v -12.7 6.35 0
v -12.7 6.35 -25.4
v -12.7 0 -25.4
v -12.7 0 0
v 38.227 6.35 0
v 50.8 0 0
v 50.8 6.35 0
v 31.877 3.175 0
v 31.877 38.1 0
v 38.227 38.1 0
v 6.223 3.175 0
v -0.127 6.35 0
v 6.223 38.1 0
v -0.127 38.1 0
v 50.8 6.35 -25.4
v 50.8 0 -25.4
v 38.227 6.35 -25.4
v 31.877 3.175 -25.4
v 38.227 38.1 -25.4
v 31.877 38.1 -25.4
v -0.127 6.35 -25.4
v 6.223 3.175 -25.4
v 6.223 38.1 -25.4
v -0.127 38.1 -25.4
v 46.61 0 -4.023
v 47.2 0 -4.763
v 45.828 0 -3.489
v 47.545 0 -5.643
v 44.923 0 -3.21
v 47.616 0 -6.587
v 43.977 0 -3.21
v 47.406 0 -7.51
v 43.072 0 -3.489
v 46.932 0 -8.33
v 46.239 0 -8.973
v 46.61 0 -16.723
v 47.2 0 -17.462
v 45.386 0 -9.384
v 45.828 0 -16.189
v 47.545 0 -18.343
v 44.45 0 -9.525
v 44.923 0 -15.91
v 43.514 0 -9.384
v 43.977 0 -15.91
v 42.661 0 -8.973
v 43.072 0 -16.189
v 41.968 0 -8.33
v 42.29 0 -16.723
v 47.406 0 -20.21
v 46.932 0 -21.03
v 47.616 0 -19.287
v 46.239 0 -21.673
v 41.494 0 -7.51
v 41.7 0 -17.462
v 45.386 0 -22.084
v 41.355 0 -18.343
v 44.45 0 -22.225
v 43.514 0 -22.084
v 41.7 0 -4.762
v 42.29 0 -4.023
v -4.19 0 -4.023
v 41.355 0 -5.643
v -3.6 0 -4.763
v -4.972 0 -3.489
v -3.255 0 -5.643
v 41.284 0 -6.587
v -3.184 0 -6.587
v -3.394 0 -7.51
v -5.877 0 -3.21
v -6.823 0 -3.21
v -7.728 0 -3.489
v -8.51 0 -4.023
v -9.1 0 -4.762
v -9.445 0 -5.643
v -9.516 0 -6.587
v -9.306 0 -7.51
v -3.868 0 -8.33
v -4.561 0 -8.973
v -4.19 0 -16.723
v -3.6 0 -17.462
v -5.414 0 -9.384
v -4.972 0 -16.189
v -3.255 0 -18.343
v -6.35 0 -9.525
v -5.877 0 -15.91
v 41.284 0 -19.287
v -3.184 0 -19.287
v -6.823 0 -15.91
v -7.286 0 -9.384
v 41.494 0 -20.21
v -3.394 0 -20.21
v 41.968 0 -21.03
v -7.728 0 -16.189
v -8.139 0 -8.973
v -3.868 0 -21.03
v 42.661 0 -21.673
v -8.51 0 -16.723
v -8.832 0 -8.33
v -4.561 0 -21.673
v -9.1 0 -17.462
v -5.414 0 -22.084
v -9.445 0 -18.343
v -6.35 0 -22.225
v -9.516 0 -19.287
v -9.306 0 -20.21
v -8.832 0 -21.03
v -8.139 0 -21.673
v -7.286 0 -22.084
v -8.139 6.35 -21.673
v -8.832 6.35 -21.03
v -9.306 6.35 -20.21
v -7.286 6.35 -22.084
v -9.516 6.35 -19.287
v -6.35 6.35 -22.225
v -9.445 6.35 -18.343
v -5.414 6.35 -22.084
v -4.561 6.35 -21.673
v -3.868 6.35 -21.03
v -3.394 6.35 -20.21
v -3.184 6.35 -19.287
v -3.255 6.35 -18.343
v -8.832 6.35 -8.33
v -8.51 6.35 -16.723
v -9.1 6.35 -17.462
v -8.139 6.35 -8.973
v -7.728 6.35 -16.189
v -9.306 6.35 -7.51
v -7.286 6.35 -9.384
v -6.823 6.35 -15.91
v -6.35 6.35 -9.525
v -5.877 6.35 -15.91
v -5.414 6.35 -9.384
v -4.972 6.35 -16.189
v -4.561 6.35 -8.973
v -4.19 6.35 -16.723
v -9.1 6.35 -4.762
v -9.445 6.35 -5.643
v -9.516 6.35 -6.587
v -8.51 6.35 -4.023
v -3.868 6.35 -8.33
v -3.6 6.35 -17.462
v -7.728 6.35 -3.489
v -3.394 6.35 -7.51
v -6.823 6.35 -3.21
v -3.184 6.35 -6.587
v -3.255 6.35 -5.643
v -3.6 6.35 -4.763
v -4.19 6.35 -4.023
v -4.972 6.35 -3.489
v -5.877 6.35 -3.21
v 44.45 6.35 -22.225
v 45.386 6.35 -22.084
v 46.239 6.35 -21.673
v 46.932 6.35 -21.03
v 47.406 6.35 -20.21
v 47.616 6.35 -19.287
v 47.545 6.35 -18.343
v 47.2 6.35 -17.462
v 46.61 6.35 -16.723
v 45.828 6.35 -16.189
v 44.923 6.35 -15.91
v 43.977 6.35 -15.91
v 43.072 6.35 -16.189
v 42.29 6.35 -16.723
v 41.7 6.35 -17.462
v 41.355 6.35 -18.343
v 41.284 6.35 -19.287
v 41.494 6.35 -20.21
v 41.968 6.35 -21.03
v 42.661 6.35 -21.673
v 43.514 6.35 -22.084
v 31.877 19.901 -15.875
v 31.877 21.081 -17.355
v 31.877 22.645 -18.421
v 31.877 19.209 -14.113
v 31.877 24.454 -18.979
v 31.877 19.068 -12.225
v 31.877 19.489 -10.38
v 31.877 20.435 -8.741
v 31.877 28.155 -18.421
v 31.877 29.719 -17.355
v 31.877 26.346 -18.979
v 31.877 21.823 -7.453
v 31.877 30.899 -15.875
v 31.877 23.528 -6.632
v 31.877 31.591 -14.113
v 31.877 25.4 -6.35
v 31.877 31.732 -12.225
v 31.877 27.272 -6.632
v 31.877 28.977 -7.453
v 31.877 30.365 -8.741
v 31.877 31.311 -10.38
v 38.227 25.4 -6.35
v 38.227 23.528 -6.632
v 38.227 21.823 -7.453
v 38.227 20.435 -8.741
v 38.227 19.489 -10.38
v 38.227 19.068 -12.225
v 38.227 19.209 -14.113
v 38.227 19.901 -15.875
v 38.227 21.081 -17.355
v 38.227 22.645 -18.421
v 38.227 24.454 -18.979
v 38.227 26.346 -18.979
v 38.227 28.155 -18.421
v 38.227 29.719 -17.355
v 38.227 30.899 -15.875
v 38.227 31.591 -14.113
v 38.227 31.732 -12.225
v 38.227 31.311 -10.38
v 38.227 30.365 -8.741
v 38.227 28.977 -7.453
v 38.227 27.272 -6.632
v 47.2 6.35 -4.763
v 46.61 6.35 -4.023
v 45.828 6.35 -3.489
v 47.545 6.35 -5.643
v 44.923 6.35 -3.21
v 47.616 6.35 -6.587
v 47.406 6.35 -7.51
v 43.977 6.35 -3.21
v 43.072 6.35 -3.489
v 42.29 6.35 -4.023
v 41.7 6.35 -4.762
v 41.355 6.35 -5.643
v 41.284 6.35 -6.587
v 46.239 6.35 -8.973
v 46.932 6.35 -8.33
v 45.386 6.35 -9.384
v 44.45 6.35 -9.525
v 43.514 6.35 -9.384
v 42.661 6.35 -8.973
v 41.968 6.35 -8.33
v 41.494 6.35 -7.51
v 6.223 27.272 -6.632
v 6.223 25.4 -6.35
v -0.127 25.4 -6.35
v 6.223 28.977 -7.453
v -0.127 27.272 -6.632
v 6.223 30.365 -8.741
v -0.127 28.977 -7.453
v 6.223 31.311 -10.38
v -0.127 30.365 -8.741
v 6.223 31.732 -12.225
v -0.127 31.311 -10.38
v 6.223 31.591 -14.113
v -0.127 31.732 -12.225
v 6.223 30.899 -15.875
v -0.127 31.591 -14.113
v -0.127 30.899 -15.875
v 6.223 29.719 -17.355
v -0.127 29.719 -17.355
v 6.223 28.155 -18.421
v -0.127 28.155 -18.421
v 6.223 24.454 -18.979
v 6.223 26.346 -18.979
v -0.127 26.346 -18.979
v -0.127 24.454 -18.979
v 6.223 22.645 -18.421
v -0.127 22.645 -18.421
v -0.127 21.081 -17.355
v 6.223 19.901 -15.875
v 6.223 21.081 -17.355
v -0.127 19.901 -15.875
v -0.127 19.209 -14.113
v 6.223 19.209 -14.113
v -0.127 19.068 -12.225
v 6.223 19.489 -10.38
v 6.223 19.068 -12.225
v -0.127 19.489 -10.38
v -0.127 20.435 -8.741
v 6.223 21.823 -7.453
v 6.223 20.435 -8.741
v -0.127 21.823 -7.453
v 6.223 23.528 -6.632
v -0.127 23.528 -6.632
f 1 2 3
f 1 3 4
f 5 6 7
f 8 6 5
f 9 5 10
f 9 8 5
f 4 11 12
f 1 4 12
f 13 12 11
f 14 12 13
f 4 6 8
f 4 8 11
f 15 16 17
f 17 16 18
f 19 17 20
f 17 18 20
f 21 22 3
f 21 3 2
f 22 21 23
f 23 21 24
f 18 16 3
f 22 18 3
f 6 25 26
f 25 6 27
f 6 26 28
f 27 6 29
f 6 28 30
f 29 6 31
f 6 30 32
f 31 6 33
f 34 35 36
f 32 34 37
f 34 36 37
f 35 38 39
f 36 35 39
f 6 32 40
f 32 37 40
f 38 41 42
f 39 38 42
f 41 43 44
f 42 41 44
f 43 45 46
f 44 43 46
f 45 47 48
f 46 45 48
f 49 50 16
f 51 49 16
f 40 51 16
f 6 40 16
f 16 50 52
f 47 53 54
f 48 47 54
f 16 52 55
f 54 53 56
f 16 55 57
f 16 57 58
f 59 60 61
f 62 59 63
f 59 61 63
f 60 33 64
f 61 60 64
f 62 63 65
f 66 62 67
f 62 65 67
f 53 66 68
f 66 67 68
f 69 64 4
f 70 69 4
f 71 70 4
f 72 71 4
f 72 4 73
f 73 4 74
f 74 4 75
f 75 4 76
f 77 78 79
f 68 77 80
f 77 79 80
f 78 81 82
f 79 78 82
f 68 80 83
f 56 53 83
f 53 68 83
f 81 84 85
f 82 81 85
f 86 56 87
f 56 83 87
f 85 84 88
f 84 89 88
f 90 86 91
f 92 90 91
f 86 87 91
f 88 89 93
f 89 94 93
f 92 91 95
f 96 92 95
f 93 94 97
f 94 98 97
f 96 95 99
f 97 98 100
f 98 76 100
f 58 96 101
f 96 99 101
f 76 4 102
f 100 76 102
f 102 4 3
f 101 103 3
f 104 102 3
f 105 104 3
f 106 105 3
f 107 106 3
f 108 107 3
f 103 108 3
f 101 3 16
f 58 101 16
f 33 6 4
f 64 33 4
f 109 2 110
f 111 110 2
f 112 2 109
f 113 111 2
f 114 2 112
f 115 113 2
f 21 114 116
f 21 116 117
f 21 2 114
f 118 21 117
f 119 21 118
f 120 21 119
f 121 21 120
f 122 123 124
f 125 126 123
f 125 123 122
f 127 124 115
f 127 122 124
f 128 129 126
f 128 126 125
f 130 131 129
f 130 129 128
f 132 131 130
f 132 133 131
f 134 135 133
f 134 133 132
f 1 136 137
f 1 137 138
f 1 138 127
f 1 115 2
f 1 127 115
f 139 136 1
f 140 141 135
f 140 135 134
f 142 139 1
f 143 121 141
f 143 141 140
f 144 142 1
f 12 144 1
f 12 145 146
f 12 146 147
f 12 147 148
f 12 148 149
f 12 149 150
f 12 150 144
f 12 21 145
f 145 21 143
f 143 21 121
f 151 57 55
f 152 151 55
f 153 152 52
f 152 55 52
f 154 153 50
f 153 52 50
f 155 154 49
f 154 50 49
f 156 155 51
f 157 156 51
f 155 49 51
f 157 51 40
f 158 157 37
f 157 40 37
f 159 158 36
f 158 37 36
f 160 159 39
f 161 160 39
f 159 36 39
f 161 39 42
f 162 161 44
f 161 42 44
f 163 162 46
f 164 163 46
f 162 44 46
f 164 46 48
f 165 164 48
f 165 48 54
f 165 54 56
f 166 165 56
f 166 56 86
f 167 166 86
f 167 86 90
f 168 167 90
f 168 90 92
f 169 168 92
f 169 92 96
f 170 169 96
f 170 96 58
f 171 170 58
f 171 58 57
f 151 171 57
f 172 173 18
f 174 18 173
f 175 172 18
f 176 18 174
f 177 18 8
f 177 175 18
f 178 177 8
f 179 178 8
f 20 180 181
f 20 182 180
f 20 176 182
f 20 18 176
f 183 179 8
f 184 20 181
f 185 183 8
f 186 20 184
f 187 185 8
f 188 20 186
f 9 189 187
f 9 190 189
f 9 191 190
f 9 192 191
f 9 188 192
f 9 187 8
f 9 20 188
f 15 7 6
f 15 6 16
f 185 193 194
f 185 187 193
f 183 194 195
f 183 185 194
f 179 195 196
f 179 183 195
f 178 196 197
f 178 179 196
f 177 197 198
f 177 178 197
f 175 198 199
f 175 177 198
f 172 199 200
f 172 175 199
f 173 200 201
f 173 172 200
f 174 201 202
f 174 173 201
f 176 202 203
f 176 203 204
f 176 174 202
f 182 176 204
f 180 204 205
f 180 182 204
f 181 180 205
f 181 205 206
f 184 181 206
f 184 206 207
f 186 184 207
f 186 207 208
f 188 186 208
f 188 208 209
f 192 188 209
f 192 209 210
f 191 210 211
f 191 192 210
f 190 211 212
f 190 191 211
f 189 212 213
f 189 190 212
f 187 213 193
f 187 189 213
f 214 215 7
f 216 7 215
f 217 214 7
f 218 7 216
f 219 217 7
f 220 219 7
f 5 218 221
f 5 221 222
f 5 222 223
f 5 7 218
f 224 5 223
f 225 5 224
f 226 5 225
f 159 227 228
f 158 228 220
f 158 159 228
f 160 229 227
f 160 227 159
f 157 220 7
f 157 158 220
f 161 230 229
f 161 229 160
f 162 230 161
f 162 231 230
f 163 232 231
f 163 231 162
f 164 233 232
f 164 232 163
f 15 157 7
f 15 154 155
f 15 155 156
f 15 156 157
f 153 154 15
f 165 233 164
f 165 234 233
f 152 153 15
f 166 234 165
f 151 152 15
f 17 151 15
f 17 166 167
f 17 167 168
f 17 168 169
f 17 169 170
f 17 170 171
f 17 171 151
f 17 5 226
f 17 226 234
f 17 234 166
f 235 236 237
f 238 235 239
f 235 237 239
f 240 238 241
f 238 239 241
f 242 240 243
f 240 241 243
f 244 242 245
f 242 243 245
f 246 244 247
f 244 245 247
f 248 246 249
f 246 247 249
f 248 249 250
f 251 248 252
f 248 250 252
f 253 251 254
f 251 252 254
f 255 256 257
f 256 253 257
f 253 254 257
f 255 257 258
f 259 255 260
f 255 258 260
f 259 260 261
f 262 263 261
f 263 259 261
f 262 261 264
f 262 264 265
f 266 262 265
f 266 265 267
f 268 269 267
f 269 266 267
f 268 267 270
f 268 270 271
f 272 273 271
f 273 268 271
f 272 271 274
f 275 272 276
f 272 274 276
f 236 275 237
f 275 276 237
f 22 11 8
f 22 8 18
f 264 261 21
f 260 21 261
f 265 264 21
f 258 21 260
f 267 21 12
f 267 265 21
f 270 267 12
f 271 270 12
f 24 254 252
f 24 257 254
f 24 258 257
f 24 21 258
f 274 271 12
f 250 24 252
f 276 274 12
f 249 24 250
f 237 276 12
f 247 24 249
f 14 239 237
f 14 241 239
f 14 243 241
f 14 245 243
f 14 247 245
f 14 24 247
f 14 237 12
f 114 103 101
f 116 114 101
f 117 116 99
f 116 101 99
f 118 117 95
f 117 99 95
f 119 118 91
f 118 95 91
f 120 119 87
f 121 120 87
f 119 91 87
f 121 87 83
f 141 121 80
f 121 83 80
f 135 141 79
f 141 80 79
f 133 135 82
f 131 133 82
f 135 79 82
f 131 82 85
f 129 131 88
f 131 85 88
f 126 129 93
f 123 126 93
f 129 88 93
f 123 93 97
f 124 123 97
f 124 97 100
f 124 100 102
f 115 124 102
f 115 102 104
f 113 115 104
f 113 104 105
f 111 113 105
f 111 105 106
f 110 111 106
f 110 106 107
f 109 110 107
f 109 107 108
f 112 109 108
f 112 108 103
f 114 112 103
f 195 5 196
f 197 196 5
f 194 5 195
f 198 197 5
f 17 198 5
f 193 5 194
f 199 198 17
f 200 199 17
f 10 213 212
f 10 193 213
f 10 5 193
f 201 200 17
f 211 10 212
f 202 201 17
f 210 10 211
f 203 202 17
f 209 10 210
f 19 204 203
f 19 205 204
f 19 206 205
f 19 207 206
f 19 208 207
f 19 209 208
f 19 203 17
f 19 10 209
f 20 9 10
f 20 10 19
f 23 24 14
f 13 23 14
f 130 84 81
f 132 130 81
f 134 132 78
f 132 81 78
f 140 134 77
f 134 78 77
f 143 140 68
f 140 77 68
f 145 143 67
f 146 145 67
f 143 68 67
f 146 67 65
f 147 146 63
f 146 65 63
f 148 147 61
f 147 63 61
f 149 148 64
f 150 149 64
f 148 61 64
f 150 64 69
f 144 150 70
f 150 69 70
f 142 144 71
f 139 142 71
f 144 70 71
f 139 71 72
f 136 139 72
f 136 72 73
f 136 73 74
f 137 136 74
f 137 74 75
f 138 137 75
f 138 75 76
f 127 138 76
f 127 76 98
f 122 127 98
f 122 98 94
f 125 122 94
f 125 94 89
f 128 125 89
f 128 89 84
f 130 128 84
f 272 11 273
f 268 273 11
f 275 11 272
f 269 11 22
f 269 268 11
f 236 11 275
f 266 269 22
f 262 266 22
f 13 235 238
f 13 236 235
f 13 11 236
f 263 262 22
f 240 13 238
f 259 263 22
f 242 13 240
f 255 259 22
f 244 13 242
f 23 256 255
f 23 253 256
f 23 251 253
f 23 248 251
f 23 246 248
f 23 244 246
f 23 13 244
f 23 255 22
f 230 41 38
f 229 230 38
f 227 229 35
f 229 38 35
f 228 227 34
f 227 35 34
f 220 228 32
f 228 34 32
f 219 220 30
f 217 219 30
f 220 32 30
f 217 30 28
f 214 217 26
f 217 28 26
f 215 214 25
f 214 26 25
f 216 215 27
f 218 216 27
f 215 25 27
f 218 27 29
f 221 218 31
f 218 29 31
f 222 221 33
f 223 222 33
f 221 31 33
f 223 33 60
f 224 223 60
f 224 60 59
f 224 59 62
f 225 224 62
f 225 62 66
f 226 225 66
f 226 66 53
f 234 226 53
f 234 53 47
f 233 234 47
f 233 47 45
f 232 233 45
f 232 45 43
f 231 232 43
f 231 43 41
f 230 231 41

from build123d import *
from build123d.topology import SkipClean

# Parameters (mm, degrees)
SKETCH2_W                       = 6.35
SKETCH2_H                       = 25.4
BOSS_EXTRUDE1_DEPTH             = 38.1
BOSS_EXTRUDE1_2_DEPTH           = 38.1
SKETCH2_3_W                     = 25.4
SKETCH2_3_H                     = 25.4
BOSS_EXTRUDE2_DEPTH             = 3.175
SKETCH3_R                       = 6.35
CUT_EXTRUDE1_DEPTH              = 60.56828015
SKETCH4_W                       = 25.4
SKETCH4_H                       = 6.35
BOSS_EXTRUDE3_DEPTH             = 12.7
SKETCH9_W                       = 25.4
SKETCH9_H                       = 6.35
BOSS_EXTRUDE5_DEPTH             = 12.7
F_1_4_0_25_DIAMETER_HOLE1_D     = 6.35
F_1_4_0_25_DIAMETER_HOLE1_DEPTH = 25.4
F_1_4_0_25_DIAMETER_HOLE1_TIP   = 1.907732465
CUT_EXTRUDE2_START              = -0.127
SKETCH13_W                      = 25.4
SKETCH13_H                      = 34.925
SKETCH13_R                      = 6.35
CUT_EXTRUDE2_DEPTH              = 0.127
SKETCH14_W                      = 25.4
SKETCH14_H                      = 34.925
SKETCH14_R                      = 6.35
CUT_EXTRUDE3_DEPTH              = 0.127
SKETCH16_W                      = 25.4
SKETCH16_H                      = 31.75
SKETCH16_R                      = 6.35
BOSS_EXTRUDE8_DEPTH             = 0.127
BOSS_EXTRUDE9_START             = 0.127
SKETCH15_W                      = 25.4
SKETCH15_H                      = 31.75
SKETCH15_R                      = 6.35
BOSS_EXTRUDE9_DEPTH             = 0.127


with BuildPart() as part:
    # Sketch2 → Boss-Extrude1 (new body)
    with BuildSketch(Plane(origin=(0, 0, 0), x_dir=(1, 0, 0), z_dir=(0, 1, 0))):
        with Locations((3.175, 12.7)):
            Rectangle(SKETCH2_W, SKETCH2_H)
    extrude(amount=BOSS_EXTRUDE1_DEPTH)



with BuildPart() as body_2:
    # Sketch2 → Boss-Extrude1 2 (new body)
    with BuildSketch(Plane(origin=(0, 0, 0), x_dir=(1, 0, 0), z_dir=(0, 1, 0))):
        with Locations((34.925, 12.7)):
            Rectangle(SKETCH2_W, SKETCH2_H)
    extrude(amount=BOSS_EXTRUDE1_2_DEPTH)


with BuildPart() as part_1:
    add(part.part)

    add(body_2.part)  # Boss-Extrude2 merges body 2
    # Sketch2<3> → Boss-Extrude2 (add)
    with BuildSketch(Plane(origin=(0, 0, 0), x_dir=(1, 0, 0), z_dir=(0, 1, 0))):
        with Locations((19.05, 12.7)):
            Rectangle(SKETCH2_3_W, SKETCH2_3_H)
    extrude(amount=BOSS_EXTRUDE2_DEPTH)

    # Sketch3 → Cut-Extrude1 (cut, through all)
    with BuildSketch(Plane.ZY):
        with Locations((-12.7, 25.4)):
            Circle(SKETCH3_R)
    extrude(amount=-CUT_EXTRUDE1_DEPTH, mode=Mode.SUBTRACT)

    # Sketch4 → Boss-Extrude3 (add)
    with BuildSketch(Plane.ZY):
        with Locations((-12.7, 3.175)):
            Rectangle(SKETCH4_W, SKETCH4_H)
    extrude(amount=BOSS_EXTRUDE3_DEPTH)

    # Sketch9 → Boss-Extrude5 (add)
    with BuildSketch(Plane(origin=(38.1, 0, 0), x_dir=(0, 0, -1), z_dir=(1, 0, 0))):
        with Locations((12.7, 3.175)):
            Rectangle(SKETCH9_W, SKETCH9_H)
    extrude(amount=BOSS_EXTRUDE5_DEPTH)

    # 1/4 (0.25) Diameter Hole1
    with Locations(Plane(origin=(-6.35, 6.35, -19.05), x_dir=(0, 0, 1), z_dir=(0, 1, 0))):
        with Locations((0, 0), (12.7, 0), (12.7, 50.8), (0, 50.8)):
            Hole(F_1_4_0_25_DIAMETER_HOLE1_D / 2, depth=F_1_4_0_25_DIAMETER_HOLE1_DEPTH)
            with Locations((0, 0, -(F_1_4_0_25_DIAMETER_HOLE1_DEPTH + F_1_4_0_25_DIAMETER_HOLE1_TIP / 2))):  # 118° drill point
                Cone(0, F_1_4_0_25_DIAMETER_HOLE1_D / 2, F_1_4_0_25_DIAMETER_HOLE1_TIP, mode=Mode.SUBTRACT)

    # Sketch13 → Cut-Extrude2 (cut)
    with BuildSketch(Plane(origin=(6.35, 0, 0), x_dir=(0, 0, -1), z_dir=(1, 0, 0)).offset(CUT_EXTRUDE2_START)):
        with Locations((12.7, 20.6375)):
            Rectangle(SKETCH13_W, SKETCH13_H)
        with Locations((12.7, 25.4)):
            Circle(SKETCH13_R, mode=Mode.SUBTRACT)
    extrude(amount=CUT_EXTRUDE2_DEPTH, mode=Mode.SUBTRACT)

    # Sketch14 → Cut-Extrude3 (cut)
    with BuildSketch(Plane.ZY.offset(-31.75)):
        with Locations((-12.7, 20.6375)):
            Rectangle(SKETCH14_W, SKETCH14_H)
        with Locations((-12.7, 25.4)):
            Circle(SKETCH14_R, mode=Mode.SUBTRACT)
    extrude(amount=-CUT_EXTRUDE3_DEPTH, mode=Mode.SUBTRACT)

    # Sketch16 → Boss-Extrude8 (add)
    with SkipClean():  # the faces are left unmerged after this step: merging them gives an invalid solid
        with BuildSketch(Plane(origin=(38.1, 0, 0), x_dir=(0, 0, -1), z_dir=(1, 0, 0))):
            with Locations((12.7, 22.225)):
                Rectangle(SKETCH16_W, SKETCH16_H)
            with Locations((12.7, 25.4)):
                Circle(SKETCH16_R, mode=Mode.SUBTRACT)
        extrude(amount=BOSS_EXTRUDE8_DEPTH)

    # Sketch15 → Boss-Extrude9 (add)
    with SkipClean():  # the faces are left unmerged after this step: merging them gives an invalid solid
        with BuildSketch(Plane.ZY.offset(BOSS_EXTRUDE9_START)):
            with Locations((-12.7, 22.225)):
                Rectangle(SKETCH15_W, SKETCH15_H)
            with Locations((-12.7, 25.4)):
                Circle(SKETCH15_R, mode=Mode.SUBTRACT)
        extrude(amount=-BOSS_EXTRUDE9_DEPTH)


solid = part_1.part
